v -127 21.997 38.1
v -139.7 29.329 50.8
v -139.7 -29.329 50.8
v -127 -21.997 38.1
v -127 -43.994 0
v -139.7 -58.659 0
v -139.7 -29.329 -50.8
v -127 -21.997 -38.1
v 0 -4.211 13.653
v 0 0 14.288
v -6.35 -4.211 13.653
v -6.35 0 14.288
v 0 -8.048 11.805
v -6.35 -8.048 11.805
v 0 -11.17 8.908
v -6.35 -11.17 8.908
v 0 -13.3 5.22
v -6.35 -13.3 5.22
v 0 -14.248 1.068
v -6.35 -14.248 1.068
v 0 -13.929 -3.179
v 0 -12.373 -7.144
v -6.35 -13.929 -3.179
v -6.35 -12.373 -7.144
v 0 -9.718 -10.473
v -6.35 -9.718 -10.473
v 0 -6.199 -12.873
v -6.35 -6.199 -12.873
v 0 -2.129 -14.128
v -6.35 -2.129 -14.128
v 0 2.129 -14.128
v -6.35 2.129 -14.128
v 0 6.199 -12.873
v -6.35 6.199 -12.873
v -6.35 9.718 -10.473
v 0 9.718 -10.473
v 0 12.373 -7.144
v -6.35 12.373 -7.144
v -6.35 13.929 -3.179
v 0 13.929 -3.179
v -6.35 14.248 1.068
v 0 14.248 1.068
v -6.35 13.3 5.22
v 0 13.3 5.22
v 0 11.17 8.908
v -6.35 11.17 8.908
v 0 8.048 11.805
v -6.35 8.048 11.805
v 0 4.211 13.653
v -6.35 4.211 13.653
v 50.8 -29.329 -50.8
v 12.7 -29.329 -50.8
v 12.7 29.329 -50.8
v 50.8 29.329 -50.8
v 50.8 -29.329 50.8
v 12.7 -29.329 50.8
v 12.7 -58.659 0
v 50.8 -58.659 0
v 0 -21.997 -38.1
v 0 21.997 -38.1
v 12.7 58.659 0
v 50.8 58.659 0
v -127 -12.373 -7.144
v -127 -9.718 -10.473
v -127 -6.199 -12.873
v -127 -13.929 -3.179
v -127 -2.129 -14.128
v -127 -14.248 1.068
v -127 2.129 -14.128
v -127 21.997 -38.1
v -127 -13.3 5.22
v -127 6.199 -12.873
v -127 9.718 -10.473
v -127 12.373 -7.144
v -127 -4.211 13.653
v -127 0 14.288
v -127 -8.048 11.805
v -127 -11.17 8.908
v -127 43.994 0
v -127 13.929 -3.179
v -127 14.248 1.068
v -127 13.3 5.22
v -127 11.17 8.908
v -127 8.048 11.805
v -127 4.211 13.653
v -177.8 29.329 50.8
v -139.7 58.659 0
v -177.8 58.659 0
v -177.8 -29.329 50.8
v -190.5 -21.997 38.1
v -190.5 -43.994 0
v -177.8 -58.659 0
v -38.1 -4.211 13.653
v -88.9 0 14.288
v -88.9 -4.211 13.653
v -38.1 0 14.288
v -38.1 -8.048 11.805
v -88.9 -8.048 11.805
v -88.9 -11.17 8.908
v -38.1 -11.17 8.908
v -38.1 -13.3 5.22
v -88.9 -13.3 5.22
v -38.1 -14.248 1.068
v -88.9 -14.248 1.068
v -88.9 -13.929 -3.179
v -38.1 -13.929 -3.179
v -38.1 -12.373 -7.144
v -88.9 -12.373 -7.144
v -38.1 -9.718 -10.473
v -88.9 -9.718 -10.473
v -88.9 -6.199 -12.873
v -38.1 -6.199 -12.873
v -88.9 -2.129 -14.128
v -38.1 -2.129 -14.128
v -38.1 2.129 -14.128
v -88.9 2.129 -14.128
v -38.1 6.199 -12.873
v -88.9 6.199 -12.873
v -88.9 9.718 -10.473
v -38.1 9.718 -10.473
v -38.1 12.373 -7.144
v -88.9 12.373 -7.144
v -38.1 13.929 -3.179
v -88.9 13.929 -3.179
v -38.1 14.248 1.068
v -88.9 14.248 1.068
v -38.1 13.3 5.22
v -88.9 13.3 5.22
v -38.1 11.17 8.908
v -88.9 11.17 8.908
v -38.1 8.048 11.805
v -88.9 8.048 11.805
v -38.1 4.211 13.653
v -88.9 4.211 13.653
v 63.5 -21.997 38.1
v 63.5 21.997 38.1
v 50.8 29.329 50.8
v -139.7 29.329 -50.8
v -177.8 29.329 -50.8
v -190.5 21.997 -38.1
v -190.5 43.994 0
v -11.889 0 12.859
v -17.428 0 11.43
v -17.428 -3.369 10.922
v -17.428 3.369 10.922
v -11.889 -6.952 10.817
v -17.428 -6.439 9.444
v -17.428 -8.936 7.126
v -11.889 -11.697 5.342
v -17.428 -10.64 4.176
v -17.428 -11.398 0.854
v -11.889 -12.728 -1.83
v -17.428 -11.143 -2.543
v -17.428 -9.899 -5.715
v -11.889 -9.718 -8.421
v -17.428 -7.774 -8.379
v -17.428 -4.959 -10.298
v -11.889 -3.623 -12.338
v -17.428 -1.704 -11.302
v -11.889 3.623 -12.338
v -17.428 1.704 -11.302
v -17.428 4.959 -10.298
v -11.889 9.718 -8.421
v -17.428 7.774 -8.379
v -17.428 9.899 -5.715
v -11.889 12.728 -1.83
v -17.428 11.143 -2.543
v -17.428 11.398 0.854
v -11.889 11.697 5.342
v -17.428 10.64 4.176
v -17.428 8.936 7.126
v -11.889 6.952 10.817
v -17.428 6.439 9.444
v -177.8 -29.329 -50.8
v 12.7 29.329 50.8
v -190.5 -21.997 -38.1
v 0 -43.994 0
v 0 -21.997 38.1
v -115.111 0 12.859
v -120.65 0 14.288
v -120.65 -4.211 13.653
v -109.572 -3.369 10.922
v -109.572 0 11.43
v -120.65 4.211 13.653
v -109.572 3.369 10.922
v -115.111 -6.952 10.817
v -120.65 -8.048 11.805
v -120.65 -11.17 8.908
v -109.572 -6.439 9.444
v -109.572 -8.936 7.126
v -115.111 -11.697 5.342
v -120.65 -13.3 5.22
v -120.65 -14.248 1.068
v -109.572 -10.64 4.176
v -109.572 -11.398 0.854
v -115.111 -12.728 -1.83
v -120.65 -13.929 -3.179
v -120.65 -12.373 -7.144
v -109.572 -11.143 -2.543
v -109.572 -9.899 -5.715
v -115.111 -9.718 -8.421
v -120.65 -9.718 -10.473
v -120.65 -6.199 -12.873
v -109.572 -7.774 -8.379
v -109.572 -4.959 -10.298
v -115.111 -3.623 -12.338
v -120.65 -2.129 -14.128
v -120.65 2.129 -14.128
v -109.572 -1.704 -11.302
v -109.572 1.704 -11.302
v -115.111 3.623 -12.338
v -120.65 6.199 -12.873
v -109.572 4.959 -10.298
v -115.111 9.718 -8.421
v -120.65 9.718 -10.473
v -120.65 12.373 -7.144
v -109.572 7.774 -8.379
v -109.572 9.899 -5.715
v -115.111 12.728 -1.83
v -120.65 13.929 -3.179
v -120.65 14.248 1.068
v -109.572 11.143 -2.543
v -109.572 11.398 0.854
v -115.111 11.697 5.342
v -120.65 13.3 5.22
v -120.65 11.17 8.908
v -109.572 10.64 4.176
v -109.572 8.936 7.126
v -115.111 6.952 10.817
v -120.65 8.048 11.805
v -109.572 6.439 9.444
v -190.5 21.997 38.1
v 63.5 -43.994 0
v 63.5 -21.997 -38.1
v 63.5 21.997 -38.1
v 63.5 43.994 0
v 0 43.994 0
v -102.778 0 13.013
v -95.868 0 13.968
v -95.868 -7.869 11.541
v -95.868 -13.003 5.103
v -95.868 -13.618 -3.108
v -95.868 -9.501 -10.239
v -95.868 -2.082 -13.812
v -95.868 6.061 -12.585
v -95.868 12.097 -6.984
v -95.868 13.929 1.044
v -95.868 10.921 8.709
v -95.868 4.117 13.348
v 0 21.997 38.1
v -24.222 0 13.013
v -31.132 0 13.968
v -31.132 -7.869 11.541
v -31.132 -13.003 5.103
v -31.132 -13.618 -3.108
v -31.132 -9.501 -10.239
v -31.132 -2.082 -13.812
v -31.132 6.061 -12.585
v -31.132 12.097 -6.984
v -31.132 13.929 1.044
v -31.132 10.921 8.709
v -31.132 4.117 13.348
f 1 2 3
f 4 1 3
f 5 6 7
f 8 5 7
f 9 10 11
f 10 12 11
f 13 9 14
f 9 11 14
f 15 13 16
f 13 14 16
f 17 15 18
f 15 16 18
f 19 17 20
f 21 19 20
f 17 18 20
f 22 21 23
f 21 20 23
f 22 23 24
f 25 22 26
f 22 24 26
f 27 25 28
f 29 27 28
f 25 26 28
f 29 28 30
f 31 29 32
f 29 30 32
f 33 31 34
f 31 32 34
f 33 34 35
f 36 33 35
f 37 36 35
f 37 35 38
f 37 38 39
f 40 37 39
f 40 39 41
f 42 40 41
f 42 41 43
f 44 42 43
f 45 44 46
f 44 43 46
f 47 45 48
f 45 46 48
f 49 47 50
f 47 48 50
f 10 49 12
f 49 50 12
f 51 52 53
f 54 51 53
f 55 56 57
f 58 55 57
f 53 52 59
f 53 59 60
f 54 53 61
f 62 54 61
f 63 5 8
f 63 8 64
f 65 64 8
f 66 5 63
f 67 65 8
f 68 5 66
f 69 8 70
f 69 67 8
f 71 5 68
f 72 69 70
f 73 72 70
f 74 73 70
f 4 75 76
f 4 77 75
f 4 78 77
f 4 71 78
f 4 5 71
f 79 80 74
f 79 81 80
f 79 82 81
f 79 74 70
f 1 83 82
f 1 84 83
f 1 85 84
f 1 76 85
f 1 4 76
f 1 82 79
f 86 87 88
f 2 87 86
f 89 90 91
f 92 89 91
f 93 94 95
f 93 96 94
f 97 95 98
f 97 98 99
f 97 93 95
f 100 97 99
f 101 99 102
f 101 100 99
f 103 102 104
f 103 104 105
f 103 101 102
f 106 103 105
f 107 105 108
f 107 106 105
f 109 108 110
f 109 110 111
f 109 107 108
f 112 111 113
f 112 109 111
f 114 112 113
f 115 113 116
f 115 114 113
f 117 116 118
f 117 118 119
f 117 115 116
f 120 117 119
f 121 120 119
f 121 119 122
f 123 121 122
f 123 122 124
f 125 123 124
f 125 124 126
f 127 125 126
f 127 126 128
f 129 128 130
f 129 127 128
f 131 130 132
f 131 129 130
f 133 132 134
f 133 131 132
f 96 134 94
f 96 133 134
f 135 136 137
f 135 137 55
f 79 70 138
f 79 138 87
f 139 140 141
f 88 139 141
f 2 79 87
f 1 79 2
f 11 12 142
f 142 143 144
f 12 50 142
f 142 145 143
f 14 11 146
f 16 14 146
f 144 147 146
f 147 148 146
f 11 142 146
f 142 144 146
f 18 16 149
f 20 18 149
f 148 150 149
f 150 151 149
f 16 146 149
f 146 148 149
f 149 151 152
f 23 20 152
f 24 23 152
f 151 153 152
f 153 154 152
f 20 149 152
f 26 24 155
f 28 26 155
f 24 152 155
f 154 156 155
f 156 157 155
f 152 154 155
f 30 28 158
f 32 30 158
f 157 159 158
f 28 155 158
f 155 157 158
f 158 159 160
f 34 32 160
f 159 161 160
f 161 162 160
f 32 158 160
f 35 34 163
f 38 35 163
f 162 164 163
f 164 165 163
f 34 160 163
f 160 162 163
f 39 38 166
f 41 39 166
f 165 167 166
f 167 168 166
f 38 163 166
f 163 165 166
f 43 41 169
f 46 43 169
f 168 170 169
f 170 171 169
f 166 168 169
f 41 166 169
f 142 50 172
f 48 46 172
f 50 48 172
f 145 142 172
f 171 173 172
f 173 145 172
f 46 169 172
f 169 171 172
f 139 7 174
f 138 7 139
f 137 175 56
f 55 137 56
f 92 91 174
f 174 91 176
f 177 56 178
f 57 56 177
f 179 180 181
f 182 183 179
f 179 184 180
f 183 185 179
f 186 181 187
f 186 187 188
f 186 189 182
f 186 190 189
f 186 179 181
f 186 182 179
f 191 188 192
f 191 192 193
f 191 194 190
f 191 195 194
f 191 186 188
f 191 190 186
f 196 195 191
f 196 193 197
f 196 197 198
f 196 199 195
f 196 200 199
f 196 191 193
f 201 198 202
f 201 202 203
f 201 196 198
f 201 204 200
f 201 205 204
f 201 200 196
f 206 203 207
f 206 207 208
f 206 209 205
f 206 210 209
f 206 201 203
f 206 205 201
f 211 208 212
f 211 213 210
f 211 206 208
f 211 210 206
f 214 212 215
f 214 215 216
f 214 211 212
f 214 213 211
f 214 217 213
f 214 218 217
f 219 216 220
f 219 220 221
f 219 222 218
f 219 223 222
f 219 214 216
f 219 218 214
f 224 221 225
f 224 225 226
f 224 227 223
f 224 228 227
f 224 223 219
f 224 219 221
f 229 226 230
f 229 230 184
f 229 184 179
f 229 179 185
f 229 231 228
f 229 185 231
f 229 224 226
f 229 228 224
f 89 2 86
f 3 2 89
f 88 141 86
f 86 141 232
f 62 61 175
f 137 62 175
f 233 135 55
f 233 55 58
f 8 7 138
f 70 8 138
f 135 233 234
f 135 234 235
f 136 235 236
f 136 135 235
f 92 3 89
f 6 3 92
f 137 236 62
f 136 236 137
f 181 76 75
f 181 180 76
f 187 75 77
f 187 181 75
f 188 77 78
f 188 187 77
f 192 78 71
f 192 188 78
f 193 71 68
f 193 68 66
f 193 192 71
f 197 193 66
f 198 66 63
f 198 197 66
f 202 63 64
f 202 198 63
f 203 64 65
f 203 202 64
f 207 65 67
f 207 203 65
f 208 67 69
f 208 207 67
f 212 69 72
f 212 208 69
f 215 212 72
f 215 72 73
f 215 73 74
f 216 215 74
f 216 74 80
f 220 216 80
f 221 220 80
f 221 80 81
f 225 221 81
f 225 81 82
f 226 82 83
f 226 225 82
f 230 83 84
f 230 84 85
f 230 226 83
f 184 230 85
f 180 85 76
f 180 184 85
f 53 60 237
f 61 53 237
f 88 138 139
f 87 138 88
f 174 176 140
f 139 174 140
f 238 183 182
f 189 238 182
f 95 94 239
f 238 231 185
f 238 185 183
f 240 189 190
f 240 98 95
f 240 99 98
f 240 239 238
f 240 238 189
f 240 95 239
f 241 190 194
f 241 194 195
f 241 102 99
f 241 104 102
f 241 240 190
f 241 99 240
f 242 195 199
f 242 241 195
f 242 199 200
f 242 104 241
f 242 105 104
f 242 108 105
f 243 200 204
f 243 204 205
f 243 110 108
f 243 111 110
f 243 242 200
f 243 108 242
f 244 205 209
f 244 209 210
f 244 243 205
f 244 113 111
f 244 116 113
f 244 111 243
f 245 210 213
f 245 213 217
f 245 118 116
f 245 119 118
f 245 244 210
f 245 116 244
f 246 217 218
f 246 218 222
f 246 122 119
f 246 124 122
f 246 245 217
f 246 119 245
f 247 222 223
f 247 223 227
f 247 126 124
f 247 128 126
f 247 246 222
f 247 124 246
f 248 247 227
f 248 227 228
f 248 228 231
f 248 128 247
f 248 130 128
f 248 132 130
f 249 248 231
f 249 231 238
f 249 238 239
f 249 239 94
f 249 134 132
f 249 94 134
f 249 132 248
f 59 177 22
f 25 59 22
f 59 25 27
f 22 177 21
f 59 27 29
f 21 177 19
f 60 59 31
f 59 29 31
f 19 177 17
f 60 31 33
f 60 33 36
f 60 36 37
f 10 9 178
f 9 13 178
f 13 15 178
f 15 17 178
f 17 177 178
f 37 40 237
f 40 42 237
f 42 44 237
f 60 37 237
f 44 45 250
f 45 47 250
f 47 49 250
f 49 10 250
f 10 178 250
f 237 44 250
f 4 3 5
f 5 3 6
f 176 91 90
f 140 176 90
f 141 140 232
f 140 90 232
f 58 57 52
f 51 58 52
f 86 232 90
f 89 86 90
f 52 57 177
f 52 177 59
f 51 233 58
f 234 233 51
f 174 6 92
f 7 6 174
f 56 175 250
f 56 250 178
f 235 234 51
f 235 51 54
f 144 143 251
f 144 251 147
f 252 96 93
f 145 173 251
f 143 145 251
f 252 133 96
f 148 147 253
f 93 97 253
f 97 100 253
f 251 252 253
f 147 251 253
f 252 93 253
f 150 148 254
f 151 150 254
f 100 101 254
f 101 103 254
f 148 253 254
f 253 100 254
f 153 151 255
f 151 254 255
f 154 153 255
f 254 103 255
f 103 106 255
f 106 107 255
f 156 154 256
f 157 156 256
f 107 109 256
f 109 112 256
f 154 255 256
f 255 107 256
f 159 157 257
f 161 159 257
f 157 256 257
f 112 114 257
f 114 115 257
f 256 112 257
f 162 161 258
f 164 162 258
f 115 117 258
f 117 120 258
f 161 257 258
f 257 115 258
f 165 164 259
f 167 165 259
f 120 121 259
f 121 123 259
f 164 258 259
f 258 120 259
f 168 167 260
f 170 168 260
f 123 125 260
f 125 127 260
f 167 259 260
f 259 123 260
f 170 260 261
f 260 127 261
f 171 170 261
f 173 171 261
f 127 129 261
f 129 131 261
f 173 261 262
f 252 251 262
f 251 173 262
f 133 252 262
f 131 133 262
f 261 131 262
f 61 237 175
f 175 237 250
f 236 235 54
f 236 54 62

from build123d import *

# Parameters (mm, degrees)
BOSS_EXTRUDE1_DEPTH = 63.5
CHAMFER1_SIZE       = 12.7
CHAMFER2_SIZE       = 12.7


with BuildPart() as part:
    # Sketch1 → Boss-Extrude1 (new body)
    with BuildSketch(Plane.YZ):
        Polygon((58.65878735, 0), (29.329393675, 50.8), (-29.329393675, 50.8), (-58.65878735, 0), (-29.329393675, -50.8), (29.329393675, -50.8), align=None)
    extrude(amount=BOSS_EXTRUDE1_DEPTH)

    # Chamfer1
    chamfer1_edges = [part.edges().sort_by_distance(p)[0] for p in [
        (63.5, 0, 50.8),
        (63.5, -43.994090512, 25.4),
        (63.5, -43.994090512, -25.4),
        (63.5, 0, -50.8),
        (63.5, 43.994090512, -25.4),
        (63.5, 43.994090512, 25.4),
    ]]
    chamfer(chamfer1_edges, length=CHAMFER1_SIZE)

    # Chamfer2
    chamfer2_edges = [part.edges().sort_by_distance(p)[0] for p in [
        (0, 0, -50.8),
        (0, -43.994090512, -25.4),
        (0, -43.994090512, 25.4),
        (0, 0, 50.8),
        (0, 43.994090512, 25.4),
        (0, 43.994090512, -25.4),
    ]]
    chamfer(chamfer2_edges, length=CHAMFER2_SIZE)

    # Sketch2 → Revolve1 (revolve)
    with BuildSketch(Plane(origin=(0, 0, 0), x_dir=(-1, 0, 0), z_dir=(0, 1, 0))):
        with BuildLine():
            Line((0, 0), (0, 14.2875))
            Line((0, 14.2875), (6.35, 14.2875))
            Line((6.35, 14.2875), (17.42833597, 11.43))
            ThreePointArc((17.42833597, 11.43), (27.66588528, 13.569744601), (38.1, 14.2875))
            Line((38.1, 14.2875), (63.5, 14.2875))
            Line((63.5, 14.2875), (63.5, 0))
            Line((63.5, 0), (0, 0))
        make_face()
    revolve(axis=Axis((-63.5, 0, 0), (1, 0, 0)))

    # Mirror1: part across plane


with BuildPart() as part_1:
    add(part.part)
    add(part.part.mirror(Plane(origin=(-63.5, 0, 14.2875), x_dir=(0, 0, 1), z_dir=(-1, 0, 0))))


solid = part_1.part
